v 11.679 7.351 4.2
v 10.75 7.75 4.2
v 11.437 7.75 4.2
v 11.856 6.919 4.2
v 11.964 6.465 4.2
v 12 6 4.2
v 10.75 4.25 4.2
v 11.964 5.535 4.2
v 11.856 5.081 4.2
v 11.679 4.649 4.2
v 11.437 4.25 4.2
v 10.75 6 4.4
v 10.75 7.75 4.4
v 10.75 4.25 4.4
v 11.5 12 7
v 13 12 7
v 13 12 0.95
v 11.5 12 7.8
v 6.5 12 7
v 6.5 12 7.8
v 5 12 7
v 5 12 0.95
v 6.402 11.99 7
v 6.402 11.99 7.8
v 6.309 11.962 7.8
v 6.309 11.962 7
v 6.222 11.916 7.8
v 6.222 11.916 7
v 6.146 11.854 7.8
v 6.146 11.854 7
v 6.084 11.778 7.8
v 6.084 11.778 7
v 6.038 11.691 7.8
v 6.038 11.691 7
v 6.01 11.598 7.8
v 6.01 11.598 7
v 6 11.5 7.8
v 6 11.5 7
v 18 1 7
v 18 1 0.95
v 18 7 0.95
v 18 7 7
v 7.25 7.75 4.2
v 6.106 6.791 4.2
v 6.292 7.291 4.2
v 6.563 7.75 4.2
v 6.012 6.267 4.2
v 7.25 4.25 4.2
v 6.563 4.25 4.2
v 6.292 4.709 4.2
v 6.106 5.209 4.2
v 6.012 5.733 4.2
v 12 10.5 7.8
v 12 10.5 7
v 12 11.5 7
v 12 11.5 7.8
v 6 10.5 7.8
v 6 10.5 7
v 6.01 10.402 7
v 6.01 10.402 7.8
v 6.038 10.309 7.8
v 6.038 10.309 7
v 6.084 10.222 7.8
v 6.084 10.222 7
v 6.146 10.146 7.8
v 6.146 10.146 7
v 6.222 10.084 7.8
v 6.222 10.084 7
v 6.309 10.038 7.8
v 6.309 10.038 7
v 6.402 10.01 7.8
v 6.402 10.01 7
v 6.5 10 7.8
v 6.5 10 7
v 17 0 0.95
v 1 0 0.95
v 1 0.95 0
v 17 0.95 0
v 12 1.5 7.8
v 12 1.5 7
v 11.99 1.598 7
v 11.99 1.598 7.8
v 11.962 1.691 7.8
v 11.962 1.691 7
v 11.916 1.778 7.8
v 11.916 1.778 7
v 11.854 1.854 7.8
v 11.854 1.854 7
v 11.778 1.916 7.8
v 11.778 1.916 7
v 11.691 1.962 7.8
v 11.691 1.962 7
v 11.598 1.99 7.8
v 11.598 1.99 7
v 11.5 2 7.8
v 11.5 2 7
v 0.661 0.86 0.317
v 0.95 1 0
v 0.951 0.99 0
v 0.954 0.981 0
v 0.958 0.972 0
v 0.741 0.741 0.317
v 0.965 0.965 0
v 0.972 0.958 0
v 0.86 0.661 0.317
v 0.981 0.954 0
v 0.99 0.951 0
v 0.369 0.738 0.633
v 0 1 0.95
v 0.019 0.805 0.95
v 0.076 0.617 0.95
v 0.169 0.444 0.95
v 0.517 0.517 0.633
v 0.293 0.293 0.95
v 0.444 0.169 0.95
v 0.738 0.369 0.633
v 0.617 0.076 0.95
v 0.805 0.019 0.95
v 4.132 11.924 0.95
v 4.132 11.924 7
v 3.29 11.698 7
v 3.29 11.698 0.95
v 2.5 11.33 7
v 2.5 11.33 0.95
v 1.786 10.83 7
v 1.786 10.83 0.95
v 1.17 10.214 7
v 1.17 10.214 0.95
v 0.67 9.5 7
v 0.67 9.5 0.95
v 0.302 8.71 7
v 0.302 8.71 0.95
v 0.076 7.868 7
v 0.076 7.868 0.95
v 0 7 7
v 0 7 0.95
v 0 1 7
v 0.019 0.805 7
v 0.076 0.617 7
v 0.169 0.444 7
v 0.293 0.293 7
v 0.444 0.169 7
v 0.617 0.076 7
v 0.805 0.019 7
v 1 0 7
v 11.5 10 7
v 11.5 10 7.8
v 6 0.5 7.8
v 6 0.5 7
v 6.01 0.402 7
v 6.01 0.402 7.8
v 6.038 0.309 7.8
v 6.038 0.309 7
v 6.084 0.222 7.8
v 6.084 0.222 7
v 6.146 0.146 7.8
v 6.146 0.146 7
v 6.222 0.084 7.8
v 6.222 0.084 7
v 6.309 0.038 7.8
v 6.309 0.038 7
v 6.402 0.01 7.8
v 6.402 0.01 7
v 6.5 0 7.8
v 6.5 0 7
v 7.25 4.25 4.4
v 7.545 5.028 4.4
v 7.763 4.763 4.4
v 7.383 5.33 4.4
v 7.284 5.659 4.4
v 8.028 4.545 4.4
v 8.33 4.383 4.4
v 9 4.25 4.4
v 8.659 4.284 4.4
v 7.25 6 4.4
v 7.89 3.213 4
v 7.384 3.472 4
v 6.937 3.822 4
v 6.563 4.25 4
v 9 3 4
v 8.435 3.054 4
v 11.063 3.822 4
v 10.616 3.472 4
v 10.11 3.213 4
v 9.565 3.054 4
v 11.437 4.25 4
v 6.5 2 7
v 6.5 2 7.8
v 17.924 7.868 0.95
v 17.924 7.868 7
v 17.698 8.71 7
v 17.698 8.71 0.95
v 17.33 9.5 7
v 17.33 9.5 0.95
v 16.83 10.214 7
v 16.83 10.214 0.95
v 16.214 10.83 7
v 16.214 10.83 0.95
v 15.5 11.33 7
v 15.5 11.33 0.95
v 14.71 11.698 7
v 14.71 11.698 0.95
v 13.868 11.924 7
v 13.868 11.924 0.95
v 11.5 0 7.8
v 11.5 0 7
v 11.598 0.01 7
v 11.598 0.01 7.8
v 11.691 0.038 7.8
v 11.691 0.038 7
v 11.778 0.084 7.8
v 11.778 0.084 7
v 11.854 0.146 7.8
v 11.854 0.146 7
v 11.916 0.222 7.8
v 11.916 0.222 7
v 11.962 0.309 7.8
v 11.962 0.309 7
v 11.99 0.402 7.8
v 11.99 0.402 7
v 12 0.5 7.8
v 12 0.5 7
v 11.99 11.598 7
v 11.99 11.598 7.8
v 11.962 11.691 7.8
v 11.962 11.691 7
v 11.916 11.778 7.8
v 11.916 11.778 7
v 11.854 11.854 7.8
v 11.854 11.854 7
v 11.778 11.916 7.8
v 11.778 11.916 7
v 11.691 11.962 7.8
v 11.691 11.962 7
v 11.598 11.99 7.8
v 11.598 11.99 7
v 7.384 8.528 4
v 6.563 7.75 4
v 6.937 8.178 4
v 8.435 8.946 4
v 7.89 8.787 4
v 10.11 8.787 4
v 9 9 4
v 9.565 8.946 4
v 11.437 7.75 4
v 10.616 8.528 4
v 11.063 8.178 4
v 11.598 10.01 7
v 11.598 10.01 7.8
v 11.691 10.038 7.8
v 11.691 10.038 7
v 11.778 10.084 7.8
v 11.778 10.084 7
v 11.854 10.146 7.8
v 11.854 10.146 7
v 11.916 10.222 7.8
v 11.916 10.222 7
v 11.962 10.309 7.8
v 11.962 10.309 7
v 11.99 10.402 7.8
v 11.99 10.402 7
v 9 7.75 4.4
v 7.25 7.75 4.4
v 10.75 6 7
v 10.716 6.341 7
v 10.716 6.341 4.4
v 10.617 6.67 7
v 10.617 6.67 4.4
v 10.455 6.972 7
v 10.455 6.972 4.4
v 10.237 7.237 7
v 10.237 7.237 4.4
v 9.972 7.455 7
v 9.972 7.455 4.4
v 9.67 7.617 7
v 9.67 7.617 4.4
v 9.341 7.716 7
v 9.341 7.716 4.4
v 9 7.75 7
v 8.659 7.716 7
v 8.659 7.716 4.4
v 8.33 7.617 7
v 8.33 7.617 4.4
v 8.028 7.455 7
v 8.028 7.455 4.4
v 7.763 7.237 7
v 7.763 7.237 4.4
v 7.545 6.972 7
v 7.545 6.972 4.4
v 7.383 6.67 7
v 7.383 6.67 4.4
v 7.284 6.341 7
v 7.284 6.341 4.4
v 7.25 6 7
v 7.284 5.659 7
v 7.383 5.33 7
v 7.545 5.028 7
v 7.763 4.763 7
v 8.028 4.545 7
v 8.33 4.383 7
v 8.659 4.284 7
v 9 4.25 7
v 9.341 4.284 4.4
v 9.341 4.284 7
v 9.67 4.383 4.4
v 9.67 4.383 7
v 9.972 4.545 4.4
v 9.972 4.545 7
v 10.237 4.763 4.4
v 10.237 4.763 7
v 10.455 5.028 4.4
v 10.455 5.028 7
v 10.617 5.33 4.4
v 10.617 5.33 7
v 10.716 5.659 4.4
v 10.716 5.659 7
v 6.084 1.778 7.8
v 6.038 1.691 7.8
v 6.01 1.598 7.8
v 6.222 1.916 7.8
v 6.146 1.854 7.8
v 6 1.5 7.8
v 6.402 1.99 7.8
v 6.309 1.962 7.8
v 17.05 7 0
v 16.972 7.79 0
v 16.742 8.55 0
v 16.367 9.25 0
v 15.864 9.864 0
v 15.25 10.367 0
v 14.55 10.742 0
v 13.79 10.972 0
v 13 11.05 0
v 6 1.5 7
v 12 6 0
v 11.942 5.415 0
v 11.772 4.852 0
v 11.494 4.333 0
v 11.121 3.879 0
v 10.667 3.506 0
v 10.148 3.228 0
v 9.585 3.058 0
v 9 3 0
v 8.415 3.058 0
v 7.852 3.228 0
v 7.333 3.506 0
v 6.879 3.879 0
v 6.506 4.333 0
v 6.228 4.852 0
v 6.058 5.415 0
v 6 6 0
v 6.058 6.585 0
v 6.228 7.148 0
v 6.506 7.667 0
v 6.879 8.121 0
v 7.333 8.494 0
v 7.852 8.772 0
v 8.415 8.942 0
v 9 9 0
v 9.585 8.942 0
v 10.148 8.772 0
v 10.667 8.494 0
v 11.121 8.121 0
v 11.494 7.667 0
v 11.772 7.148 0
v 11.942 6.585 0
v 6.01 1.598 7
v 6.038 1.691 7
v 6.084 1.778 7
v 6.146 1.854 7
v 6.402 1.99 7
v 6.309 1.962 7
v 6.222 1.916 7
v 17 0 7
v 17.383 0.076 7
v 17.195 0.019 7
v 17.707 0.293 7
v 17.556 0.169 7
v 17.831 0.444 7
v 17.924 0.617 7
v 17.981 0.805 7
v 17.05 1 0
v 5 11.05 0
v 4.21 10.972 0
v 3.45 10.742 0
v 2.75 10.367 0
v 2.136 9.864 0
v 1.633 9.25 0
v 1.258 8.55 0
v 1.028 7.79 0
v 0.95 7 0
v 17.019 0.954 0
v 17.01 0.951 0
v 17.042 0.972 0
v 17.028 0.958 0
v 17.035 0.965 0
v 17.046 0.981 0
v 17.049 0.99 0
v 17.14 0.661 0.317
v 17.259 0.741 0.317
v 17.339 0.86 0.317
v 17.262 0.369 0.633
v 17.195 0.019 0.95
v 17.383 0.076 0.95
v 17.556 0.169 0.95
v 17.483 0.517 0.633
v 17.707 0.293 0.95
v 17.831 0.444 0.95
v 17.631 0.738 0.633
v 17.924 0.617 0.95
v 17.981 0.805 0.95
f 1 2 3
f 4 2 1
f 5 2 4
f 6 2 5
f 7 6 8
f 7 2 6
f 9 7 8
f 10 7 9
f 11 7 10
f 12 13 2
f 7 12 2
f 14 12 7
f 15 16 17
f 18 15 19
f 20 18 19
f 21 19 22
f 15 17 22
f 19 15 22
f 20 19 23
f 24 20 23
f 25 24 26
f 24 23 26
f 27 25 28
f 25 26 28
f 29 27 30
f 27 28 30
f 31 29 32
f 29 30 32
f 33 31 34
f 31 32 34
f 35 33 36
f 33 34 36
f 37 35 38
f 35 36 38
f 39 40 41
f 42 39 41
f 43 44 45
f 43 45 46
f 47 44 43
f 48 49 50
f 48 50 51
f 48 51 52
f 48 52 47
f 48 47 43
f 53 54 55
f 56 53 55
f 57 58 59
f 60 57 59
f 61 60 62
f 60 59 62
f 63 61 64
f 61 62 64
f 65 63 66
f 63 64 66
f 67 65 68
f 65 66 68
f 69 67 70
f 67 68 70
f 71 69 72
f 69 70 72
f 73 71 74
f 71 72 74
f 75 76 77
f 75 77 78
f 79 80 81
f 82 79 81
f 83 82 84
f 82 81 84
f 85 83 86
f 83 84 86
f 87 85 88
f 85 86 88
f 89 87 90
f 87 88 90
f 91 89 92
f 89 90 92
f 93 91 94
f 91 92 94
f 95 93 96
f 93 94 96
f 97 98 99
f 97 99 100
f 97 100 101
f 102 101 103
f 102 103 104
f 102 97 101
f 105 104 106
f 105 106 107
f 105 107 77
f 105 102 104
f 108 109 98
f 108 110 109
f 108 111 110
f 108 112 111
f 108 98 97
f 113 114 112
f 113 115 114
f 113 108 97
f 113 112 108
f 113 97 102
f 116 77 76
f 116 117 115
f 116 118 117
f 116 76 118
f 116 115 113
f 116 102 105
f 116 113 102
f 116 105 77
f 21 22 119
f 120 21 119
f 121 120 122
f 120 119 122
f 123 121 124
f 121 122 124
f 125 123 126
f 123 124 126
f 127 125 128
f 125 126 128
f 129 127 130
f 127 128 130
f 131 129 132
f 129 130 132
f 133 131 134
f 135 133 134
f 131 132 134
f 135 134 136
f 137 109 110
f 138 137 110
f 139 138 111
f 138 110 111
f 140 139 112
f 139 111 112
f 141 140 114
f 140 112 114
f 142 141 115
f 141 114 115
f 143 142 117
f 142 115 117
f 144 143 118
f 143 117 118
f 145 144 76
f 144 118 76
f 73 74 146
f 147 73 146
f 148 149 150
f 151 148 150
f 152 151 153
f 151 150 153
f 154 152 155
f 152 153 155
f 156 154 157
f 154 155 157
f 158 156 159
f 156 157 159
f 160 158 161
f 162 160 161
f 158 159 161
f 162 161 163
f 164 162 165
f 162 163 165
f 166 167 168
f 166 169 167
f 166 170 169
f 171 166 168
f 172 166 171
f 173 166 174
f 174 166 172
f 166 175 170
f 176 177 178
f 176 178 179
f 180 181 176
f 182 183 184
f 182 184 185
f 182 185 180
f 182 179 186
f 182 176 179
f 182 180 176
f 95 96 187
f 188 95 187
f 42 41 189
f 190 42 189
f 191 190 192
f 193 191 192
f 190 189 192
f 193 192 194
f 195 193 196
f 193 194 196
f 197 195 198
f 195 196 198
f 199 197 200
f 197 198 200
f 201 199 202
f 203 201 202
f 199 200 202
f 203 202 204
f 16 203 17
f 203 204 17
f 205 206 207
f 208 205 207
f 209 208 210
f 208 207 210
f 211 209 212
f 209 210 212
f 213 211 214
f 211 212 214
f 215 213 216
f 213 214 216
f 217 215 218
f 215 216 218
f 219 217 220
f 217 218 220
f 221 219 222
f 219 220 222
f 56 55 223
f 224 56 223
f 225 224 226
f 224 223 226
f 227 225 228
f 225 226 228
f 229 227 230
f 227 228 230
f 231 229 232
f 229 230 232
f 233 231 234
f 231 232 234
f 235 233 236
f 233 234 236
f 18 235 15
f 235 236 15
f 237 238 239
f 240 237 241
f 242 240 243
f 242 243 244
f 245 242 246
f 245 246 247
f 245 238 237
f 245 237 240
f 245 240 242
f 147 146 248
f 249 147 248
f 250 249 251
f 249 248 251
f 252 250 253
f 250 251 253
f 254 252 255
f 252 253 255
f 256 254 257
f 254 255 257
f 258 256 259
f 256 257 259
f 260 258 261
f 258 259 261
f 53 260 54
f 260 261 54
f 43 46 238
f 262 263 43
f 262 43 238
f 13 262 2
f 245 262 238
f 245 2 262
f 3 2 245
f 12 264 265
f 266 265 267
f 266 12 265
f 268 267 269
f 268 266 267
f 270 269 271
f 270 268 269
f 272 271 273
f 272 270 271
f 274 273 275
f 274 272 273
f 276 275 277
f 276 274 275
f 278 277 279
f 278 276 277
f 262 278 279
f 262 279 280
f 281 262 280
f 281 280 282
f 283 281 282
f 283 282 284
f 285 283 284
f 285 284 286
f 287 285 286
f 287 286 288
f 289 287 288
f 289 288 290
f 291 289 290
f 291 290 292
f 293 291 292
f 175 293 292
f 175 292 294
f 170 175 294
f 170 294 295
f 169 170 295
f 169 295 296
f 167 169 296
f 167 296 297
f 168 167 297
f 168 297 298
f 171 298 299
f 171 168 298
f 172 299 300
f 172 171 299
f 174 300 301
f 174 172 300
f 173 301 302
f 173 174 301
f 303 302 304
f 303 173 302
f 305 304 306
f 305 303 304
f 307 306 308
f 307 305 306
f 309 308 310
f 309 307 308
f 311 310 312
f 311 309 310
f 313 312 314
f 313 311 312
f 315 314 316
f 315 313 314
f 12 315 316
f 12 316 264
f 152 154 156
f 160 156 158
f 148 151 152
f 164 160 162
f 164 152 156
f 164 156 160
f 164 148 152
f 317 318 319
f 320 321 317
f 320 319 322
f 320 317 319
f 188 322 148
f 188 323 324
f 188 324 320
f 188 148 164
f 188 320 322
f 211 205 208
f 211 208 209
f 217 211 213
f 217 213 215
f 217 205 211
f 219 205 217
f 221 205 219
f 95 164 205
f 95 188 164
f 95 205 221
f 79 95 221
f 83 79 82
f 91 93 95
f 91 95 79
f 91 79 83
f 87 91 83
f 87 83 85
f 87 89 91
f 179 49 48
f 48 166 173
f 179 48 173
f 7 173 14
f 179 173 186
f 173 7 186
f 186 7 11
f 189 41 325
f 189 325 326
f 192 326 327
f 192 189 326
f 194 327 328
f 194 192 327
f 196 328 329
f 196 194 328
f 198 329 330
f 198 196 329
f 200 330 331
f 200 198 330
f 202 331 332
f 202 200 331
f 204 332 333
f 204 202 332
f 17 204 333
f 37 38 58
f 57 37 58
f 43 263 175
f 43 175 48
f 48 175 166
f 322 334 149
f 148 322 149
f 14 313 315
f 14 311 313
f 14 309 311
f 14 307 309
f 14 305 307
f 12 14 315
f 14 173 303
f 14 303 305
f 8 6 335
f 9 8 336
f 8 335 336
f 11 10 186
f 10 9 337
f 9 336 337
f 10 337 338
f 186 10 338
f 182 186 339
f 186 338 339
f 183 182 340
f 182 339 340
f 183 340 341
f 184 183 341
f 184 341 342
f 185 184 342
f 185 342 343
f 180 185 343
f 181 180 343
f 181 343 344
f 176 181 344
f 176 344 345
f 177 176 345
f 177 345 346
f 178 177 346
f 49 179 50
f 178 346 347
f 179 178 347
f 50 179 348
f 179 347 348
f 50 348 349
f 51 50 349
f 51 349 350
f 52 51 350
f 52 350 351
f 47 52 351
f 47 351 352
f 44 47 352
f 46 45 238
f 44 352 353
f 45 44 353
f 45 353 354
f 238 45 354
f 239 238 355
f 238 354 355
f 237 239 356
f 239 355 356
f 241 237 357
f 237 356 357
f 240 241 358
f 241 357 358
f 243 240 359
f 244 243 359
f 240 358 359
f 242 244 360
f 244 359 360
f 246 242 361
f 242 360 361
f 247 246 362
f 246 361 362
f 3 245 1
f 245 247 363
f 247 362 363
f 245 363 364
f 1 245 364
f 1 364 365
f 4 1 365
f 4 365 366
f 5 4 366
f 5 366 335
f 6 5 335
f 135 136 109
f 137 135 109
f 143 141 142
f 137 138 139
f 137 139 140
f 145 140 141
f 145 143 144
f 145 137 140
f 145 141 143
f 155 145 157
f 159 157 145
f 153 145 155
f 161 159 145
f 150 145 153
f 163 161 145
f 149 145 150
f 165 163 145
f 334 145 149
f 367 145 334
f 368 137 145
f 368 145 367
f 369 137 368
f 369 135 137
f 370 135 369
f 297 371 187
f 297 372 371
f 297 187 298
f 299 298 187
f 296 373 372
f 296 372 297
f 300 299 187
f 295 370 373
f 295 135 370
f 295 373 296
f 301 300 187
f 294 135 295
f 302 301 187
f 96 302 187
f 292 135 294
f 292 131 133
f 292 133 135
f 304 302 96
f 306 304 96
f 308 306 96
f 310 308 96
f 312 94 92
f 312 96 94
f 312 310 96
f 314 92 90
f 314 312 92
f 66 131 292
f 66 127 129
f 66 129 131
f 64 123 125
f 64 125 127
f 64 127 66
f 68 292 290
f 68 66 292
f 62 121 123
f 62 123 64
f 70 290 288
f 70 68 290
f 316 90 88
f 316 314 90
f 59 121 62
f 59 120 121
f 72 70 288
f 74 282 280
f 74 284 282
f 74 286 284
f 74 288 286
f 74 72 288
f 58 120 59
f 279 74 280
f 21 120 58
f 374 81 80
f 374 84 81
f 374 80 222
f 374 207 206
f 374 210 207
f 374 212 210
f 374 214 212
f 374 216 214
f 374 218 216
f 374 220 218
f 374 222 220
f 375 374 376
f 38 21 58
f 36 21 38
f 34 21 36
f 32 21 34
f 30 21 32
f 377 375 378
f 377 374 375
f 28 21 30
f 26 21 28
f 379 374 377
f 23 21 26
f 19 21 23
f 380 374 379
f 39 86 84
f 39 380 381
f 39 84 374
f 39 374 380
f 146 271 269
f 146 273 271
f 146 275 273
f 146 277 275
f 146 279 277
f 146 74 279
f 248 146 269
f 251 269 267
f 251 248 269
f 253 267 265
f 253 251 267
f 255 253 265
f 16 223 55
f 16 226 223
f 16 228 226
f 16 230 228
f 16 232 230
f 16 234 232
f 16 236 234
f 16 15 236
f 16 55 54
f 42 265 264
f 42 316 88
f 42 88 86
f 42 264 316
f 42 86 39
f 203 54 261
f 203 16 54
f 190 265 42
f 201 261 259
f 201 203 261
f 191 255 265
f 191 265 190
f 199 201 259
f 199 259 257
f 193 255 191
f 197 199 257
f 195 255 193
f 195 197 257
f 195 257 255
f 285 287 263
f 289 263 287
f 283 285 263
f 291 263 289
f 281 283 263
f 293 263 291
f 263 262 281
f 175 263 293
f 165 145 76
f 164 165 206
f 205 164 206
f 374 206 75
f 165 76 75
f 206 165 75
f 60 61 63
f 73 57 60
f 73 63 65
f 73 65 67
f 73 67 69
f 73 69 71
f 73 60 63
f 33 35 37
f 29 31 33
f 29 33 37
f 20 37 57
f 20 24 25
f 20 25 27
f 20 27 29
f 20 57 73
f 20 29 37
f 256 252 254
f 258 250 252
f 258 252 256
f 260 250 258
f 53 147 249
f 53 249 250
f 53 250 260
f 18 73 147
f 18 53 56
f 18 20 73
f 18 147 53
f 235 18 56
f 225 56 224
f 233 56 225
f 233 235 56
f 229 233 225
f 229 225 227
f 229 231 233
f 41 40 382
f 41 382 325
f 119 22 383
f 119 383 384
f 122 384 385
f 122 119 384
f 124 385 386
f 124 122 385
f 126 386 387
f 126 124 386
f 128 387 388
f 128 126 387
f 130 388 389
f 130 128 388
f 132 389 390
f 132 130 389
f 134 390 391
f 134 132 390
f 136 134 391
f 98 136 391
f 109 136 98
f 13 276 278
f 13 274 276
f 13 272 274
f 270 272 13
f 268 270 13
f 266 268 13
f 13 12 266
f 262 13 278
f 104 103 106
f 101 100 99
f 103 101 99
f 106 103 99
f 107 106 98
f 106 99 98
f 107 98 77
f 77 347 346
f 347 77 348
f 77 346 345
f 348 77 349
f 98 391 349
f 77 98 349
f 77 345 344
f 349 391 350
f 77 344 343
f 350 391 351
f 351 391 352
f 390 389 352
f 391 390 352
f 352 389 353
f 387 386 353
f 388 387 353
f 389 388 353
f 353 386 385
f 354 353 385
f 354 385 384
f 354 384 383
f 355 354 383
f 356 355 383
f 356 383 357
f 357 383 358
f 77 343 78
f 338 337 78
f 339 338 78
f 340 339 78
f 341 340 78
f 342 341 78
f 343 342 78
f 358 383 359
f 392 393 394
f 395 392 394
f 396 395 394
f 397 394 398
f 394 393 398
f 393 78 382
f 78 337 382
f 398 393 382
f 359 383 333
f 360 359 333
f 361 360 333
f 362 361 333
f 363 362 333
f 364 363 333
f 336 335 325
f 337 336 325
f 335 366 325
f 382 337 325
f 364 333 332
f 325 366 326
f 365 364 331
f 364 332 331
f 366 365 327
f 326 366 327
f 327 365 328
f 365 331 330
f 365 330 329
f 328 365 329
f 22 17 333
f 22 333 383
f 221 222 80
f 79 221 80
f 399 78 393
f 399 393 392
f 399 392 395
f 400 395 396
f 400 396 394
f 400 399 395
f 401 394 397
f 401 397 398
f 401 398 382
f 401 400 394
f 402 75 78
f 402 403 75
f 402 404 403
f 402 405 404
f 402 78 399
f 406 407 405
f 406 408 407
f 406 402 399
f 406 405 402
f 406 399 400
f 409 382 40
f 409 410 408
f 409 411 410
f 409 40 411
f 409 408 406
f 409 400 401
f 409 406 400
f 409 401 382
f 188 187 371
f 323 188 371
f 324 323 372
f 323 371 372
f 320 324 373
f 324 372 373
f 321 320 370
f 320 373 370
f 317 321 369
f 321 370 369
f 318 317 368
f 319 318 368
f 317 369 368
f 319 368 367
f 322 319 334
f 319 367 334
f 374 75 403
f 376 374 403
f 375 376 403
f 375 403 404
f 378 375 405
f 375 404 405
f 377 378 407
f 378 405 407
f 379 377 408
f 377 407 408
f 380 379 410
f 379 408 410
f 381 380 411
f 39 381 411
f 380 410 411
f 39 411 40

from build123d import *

# Parameters (mm, degrees)
SKETCH_R     = 1.75
PAD_DEPTH    = 7
PAD001_DEPTH = 0.8
SKETCH002_R  = 3
POCKET_DEPTH = 4.4
SKETCH003_R  = 3
SKETCH003_W  = 3.5
SKETCH003_H  = 3.5
PAD002_DEPTH = 0.2
PAD003_DEPTH = 0.2
CHAMFER_SIZE = 0.95


with BuildPart() as part:
    # Sketch → Pad (new body)
    with BuildSketch(Plane.XY):
        with BuildLine():
            Line((18, 1), (18, 7))
            ThreePointArc((18, 7), (16.535534, 10.535534), (13, 12))
            Line((13, 12), (5, 12))
            ThreePointArc((5, 12), (1.464466, 10.535534), (0, 7))
            Line((0, 7), (0, 1))
            ThreePointArc((0, 1), (0.292893, 0.292893), (1, 0))
            Line((1, 0), (17, 0))
            ThreePointArc((17, 0), (17.707107, 0.292893), (18, 1))
        make_face()
        with Locations((9, 6)):
            Circle(SKETCH_R, mode=Mode.SUBTRACT)
    extrude(amount=PAD_DEPTH)

    # Sketch001 (on Face11 of Pad) → Pad001 (join)
    with BuildSketch(Plane.XY.offset(7)):
        with BuildLine():
            Line((6, 11.5), (6, 10.5))
            ThreePointArc((6, 10.5), (6.146447, 10.146447), (6.5, 10))
            Line((6.5, 10), (11.5, 10))
            ThreePointArc((11.5, 10), (11.853553, 10.146447), (12, 10.5))
            Line((12, 10.5), (12, 11.5))
            ThreePointArc((12, 11.5), (11.853553, 11.853553), (11.5, 12))
            Line((11.5, 12), (6.5, 12))
            ThreePointArc((6.5, 12), (6.146447, 11.853553), (6, 11.5))
        make_face()
        with BuildLine():
            Line((6, 1.5), (6, 0.5))
            ThreePointArc((6, 0.5), (6.146447, 0.146447), (6.5, 0))
            Line((6.5, 0), (11.5, 0))
            ThreePointArc((11.5, 0), (11.853553, 0.146447), (12, 0.5))
            Line((12, 0.5), (12, 1.5))
            ThreePointArc((12, 1.5), (11.853553, 1.853553), (11.5, 2))
            Line((11.5, 2), (6.5, 2))
            ThreePointArc((6.5, 2), (6.146447, 1.853553), (6, 1.5))
        make_face()
    extrude(amount=PAD001_DEPTH)

    # Sketch002 (on Face4 of Pad001) → Pocket (cut)
    with BuildSketch(Plane(origin=(0, 0, 0), x_dir=(1, 0, 0), z_dir=(0, 0, -1))):
        with Locations((9, -6)):
            Circle(SKETCH002_R)
    extrude(amount=-POCKET_DEPTH, mode=Mode.SUBTRACT)

    # Sketch003 (on Face29 of Pocket) → Pad002 (join)
    with BuildSketch(Plane(origin=(0, 0, 4.4), x_dir=(1, 0, 0), z_dir=(0, 0, -1))):
        with Locations((9, -6)):
            Circle(SKETCH003_R)
        with Locations((9, -6)):
            Rectangle(SKETCH003_W, SKETCH003_H, mode=Mode.SUBTRACT)
    extrude(amount=PAD002_DEPTH)

    # Sketch004 (on Face29 of Pad002) → Pad003 (join)
    with BuildSketch(Plane(origin=(0, 0, 4.2), x_dir=(1, 0, 0), z_dir=(0, 0, -1))):
        with BuildLine():
            ThreePointArc((11.436699, -4.25), (9, -3), (6.563301, -4.25))
            Line((6.563301, -4.25), (11.436699, -4.25))
        make_face()
        with BuildLine():
            ThreePointArc((6.563301, -7.75), (9, -9), (11.436699, -7.75))
            Line((6.563301, -7.75), (11.436699, -7.75))
        make_face()
    extrude(amount=PAD003_DEPTH)

    # Chamfer
    chamfer_edges = [part.edges().sort_by_distance(p)[0] for p in [
        (0.292893, 0.292893, 0),
    ]]
    chamfer(chamfer_edges, length=CHAMFER_SIZE)


solid = part.part
